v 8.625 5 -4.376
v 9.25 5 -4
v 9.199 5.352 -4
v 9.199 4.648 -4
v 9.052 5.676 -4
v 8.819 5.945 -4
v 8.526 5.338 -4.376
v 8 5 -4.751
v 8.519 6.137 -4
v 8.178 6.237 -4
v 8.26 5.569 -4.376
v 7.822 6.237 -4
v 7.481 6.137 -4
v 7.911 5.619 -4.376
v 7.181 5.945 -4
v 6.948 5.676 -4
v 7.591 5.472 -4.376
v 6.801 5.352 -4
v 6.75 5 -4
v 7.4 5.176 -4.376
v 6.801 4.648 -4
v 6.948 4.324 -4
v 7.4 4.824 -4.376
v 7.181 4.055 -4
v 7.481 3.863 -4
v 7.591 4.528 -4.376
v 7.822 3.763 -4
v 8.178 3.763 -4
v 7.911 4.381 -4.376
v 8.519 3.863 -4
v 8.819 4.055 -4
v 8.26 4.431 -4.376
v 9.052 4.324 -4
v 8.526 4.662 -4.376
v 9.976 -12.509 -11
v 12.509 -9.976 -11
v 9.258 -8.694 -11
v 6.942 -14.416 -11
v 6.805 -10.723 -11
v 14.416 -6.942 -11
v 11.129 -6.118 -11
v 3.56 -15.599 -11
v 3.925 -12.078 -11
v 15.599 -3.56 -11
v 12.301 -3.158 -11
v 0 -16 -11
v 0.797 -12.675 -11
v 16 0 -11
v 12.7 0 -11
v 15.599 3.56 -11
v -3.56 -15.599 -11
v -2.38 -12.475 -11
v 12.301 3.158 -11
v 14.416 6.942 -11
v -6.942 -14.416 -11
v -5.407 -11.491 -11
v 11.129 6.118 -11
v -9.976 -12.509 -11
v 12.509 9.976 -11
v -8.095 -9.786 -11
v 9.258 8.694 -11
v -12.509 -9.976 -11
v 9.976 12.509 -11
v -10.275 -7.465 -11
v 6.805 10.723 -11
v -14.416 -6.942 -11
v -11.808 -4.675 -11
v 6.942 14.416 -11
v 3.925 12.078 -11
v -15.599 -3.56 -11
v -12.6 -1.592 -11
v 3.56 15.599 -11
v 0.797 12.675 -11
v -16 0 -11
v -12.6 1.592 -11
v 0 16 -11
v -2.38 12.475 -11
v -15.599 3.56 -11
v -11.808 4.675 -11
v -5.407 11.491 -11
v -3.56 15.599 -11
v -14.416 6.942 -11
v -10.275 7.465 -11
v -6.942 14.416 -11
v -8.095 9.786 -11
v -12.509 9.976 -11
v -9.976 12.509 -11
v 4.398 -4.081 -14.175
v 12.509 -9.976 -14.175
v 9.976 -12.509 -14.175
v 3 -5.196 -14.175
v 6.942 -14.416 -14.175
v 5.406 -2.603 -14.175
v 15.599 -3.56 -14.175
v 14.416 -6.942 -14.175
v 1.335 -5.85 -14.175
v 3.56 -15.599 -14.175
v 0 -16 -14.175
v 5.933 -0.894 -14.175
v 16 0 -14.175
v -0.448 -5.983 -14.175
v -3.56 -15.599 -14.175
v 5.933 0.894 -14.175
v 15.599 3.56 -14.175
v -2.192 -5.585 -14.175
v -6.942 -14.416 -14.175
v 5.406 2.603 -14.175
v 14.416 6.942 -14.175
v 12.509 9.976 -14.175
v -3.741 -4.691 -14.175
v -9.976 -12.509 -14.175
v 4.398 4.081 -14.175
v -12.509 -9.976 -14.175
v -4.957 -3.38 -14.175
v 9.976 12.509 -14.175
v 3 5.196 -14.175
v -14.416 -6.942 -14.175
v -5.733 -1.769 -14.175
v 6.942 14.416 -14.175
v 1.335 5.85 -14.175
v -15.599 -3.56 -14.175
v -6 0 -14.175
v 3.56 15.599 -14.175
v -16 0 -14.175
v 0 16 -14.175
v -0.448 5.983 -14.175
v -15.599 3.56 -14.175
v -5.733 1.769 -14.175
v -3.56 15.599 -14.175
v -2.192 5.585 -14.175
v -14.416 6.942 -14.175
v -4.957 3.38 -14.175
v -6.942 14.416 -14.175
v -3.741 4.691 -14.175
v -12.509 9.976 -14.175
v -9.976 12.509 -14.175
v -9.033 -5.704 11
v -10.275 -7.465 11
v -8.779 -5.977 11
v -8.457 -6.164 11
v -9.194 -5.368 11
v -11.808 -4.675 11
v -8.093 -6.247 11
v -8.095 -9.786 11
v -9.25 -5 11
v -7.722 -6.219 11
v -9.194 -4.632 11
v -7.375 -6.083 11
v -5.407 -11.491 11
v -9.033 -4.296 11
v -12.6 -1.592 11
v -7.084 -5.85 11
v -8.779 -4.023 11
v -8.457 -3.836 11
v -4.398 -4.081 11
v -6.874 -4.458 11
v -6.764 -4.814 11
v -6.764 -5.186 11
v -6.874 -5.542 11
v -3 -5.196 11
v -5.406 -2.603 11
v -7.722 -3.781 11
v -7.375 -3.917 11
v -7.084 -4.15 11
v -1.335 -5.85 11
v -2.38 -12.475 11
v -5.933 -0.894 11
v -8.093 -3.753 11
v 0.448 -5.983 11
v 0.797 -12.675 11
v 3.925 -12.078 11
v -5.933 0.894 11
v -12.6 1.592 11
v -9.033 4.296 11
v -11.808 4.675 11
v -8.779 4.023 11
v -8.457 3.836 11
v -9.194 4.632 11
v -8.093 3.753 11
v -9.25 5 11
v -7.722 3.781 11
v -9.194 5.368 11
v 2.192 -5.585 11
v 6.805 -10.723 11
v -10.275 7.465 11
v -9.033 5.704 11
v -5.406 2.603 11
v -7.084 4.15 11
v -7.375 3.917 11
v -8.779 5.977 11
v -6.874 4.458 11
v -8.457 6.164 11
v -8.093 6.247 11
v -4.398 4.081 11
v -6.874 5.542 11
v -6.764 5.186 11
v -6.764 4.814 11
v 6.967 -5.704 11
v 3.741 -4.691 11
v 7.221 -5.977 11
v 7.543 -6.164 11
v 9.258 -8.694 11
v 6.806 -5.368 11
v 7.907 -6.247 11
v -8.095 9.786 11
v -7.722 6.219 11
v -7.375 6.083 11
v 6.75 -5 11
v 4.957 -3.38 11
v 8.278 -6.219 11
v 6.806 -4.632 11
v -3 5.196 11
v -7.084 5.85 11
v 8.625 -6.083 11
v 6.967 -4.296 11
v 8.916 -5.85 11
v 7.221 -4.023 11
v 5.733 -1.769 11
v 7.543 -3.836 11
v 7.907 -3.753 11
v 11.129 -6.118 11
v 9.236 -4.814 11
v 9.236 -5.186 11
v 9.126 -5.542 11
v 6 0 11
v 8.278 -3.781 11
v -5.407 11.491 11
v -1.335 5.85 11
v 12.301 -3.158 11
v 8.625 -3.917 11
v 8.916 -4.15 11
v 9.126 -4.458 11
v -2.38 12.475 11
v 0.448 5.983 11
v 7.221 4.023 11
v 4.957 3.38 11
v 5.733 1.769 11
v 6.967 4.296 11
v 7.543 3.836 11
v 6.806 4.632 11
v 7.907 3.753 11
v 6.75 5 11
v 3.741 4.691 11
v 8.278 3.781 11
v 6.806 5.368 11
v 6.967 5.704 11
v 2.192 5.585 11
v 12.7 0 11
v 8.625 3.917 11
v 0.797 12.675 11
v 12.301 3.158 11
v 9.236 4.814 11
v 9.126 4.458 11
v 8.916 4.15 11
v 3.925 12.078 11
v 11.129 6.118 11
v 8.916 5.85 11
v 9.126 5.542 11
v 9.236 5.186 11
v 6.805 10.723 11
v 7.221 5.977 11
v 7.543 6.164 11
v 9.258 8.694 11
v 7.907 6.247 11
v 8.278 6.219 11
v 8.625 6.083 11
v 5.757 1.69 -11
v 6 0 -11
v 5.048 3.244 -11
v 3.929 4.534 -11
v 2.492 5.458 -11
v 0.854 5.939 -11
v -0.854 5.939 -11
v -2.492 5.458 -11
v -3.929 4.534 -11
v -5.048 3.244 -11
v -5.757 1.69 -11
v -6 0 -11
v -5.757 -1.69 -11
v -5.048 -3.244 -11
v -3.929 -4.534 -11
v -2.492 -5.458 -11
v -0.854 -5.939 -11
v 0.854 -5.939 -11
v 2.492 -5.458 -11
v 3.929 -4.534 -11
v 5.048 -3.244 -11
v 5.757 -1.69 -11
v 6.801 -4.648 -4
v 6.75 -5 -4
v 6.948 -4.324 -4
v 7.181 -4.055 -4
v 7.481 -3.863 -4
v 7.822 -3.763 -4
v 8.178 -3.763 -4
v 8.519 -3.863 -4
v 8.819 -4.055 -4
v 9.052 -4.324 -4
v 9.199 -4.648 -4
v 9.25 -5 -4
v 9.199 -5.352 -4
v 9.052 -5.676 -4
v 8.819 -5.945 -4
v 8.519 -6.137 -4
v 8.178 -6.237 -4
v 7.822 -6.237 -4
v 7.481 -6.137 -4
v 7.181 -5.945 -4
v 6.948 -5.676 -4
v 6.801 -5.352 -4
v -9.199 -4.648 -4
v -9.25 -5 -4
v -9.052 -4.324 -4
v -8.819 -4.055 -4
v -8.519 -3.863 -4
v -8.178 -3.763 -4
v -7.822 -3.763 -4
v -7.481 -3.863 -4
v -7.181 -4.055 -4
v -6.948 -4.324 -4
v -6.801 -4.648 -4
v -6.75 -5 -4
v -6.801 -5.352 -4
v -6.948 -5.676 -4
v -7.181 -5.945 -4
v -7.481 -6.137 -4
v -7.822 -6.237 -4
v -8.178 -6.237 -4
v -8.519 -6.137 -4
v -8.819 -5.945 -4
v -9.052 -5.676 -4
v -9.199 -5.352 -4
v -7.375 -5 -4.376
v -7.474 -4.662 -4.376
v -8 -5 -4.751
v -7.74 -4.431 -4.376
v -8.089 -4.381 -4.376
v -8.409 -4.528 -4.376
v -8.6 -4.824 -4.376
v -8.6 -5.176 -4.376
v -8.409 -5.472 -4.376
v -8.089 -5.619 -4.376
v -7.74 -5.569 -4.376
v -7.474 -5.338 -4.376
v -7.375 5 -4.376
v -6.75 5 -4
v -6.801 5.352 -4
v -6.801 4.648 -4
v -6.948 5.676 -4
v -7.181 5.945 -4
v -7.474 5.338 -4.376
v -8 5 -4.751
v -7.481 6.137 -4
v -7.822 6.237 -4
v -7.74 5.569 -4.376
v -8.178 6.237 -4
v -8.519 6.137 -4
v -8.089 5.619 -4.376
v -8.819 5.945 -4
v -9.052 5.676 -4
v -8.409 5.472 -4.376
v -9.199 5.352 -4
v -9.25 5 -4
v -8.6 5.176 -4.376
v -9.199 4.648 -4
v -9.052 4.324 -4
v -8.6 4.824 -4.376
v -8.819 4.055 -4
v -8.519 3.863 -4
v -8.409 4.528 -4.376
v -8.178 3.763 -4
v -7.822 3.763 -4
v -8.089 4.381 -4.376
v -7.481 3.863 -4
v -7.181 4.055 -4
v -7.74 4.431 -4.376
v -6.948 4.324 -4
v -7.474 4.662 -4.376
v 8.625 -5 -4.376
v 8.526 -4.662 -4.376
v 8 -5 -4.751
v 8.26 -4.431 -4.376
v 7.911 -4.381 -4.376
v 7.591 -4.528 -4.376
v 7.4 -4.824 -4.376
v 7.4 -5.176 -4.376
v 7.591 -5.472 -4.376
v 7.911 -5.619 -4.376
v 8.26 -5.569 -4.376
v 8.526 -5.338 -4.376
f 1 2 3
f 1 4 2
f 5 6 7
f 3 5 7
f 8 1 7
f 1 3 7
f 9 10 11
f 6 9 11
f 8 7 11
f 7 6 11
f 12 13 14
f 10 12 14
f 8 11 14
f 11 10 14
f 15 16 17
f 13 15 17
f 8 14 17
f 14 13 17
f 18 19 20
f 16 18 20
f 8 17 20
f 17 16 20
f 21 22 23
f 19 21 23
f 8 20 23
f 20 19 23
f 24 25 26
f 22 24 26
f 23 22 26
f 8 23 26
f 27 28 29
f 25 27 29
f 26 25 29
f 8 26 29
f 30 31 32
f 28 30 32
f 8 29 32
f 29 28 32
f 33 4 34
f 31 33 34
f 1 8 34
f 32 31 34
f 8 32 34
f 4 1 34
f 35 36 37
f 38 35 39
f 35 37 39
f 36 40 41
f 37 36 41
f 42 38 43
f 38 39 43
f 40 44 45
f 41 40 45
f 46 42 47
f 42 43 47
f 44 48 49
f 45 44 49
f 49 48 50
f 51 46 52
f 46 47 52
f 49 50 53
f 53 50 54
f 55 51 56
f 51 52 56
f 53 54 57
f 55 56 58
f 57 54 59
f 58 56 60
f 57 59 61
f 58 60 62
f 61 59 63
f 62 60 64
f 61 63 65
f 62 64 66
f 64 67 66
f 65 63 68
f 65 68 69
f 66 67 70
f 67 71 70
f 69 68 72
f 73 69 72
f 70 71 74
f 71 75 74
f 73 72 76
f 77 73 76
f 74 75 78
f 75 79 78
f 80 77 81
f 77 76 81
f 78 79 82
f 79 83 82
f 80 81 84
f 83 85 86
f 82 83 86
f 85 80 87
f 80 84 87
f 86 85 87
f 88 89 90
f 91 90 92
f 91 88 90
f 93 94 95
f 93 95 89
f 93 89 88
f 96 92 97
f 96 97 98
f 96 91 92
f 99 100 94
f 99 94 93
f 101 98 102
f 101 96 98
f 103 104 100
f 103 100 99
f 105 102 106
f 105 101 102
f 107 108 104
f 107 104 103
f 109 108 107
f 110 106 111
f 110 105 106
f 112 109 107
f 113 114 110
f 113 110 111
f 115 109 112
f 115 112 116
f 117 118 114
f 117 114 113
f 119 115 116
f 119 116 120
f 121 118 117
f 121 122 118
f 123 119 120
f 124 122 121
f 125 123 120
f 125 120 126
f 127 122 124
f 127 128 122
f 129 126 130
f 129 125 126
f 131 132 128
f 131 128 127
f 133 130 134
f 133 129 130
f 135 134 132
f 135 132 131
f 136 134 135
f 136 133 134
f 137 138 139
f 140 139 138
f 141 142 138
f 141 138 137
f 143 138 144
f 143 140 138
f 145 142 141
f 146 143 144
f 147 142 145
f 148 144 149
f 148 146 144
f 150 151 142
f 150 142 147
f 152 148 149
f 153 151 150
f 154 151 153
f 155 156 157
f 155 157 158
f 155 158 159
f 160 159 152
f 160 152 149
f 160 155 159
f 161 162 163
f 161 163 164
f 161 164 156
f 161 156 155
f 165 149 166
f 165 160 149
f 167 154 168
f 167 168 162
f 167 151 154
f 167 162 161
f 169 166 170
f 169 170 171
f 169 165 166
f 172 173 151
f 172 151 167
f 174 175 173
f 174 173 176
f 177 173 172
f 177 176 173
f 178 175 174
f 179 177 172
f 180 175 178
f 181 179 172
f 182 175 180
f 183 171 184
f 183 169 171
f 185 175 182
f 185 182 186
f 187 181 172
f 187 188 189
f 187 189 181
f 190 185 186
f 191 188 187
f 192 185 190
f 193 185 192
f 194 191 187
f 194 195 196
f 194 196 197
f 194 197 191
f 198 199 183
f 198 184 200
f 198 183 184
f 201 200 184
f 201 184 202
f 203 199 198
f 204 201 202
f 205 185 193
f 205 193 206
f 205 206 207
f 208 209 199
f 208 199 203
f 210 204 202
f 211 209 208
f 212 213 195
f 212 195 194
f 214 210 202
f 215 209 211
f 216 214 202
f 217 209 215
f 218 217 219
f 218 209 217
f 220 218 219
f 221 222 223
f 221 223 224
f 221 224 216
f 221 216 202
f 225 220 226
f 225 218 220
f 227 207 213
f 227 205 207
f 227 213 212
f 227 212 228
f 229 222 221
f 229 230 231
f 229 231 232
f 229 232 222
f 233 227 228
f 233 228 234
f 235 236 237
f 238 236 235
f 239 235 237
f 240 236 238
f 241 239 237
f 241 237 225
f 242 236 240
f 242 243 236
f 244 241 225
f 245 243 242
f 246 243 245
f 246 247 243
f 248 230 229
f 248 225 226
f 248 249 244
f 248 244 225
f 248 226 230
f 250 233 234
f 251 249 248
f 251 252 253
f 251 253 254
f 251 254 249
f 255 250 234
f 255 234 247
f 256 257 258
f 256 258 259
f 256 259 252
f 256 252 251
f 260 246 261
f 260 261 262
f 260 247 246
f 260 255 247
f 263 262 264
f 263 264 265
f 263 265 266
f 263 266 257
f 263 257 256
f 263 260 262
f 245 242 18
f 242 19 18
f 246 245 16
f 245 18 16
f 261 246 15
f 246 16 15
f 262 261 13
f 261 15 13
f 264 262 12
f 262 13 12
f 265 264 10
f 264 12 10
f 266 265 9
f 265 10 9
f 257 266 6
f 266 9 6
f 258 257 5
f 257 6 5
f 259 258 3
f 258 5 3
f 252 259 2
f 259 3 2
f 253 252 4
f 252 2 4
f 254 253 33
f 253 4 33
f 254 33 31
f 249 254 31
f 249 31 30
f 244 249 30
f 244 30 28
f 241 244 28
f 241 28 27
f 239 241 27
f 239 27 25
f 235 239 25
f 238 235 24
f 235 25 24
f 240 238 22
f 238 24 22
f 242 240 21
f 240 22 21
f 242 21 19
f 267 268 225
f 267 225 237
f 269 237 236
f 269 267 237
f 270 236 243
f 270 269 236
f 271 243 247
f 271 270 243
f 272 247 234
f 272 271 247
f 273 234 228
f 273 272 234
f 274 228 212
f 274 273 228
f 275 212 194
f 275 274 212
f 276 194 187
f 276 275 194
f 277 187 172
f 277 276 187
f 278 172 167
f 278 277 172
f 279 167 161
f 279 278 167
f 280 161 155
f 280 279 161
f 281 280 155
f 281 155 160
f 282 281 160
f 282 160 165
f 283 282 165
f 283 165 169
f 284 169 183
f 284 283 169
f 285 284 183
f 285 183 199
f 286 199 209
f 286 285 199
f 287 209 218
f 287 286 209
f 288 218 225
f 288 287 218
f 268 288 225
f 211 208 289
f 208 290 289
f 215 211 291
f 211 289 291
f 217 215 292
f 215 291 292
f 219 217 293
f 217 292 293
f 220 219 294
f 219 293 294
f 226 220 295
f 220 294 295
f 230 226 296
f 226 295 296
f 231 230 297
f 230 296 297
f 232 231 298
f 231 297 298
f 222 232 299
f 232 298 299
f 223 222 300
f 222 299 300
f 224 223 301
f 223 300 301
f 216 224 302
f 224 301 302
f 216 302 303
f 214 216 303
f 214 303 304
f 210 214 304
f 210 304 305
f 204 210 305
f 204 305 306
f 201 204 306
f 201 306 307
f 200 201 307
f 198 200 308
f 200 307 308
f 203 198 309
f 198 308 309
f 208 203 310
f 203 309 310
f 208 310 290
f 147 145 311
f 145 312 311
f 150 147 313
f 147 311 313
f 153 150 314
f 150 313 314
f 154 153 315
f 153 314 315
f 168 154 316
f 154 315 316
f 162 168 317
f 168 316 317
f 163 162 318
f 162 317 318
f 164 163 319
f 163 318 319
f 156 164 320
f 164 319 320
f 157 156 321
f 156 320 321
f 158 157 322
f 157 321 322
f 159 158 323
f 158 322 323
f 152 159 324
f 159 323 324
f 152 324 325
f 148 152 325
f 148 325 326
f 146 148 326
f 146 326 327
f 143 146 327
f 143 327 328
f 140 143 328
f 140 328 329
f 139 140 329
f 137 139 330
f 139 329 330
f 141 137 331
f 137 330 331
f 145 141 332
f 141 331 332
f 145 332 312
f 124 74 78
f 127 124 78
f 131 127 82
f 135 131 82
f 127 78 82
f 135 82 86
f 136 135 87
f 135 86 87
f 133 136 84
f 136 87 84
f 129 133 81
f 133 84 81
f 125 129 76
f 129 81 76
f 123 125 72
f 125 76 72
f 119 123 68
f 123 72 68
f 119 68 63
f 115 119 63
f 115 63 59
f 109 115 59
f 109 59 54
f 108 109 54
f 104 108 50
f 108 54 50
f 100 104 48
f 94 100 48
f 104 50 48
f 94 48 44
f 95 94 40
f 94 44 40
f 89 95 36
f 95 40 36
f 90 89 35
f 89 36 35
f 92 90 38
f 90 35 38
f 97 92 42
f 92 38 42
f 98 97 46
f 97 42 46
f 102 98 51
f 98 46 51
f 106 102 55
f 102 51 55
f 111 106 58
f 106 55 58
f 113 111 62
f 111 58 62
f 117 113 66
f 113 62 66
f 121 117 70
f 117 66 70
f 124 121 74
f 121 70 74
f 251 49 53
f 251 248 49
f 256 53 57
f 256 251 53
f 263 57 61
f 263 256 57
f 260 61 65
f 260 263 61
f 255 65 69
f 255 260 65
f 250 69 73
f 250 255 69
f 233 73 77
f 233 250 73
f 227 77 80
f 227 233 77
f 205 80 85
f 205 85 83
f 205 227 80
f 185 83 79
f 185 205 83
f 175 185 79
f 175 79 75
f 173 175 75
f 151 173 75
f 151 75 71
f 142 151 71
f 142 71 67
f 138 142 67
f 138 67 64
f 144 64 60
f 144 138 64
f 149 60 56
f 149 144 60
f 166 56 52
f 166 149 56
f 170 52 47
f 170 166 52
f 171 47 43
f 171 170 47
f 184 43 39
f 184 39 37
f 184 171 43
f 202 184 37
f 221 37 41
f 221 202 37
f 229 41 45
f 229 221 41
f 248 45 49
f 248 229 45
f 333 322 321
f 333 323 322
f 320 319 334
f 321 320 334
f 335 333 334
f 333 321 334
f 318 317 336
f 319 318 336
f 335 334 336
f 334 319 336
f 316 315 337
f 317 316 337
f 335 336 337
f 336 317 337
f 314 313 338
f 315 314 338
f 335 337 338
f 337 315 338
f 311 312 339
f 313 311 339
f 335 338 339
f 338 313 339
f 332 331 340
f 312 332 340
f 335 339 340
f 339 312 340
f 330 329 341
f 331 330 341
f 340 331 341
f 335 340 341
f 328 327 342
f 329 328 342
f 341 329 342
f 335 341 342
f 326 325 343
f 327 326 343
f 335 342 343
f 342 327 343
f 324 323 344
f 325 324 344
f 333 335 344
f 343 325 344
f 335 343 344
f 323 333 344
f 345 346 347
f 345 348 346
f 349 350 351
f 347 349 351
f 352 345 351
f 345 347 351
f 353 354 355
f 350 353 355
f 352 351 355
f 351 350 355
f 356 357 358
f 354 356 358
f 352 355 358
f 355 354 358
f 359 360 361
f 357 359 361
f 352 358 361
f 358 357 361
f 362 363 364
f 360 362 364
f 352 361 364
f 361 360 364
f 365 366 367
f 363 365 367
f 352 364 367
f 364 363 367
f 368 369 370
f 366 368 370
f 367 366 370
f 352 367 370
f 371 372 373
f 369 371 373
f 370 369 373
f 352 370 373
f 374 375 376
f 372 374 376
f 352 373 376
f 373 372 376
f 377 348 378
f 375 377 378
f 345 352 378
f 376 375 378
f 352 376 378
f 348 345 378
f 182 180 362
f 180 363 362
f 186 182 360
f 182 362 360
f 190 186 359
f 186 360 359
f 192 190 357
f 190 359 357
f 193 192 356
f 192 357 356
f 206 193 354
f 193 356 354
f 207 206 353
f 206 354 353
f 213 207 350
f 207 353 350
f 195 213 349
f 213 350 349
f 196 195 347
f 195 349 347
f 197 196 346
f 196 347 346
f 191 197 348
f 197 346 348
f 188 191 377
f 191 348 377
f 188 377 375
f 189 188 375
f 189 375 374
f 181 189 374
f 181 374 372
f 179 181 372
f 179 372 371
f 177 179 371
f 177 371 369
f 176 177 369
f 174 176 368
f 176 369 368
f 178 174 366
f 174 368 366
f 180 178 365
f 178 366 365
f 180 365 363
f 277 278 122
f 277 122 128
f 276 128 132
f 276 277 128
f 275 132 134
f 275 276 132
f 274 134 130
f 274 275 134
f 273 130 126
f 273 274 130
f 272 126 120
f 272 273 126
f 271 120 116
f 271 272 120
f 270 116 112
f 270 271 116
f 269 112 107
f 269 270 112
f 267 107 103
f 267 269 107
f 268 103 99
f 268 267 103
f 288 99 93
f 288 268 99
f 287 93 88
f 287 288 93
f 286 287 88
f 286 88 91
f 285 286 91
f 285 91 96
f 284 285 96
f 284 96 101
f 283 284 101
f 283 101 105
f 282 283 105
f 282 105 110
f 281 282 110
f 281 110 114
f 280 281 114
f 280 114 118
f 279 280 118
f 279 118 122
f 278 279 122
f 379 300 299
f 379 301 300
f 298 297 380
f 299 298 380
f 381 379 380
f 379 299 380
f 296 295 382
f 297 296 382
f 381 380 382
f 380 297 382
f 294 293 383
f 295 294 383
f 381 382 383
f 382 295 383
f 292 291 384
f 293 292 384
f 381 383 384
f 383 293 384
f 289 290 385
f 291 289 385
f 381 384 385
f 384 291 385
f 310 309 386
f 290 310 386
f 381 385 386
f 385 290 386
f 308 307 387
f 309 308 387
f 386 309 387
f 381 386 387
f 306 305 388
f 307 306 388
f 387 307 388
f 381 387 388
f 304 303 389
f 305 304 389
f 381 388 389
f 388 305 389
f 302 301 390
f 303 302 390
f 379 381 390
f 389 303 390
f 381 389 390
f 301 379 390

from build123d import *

# Parameters (mm, degrees)
SKETCH2_R                 = 12.7
SKETCH2_R_2               = 6
BOSS_EXTRUDE1_DEPTH       = 11
SKETCH3_R                 = 16
SKETCH3_R_2               = 6
BOSS_EXTRUDE2_DEPTH       = 3.175
M3X0_5_TAPPED_HOLE1_D     = 2.5
M3X0_5_TAPPED_HOLE1_DEPTH = 15
M3X0_5_TAPPED_HOLE1_TIP   = 0.751075774


with BuildPart() as part:
    # Sketch2 → Boss-Extrude1 (new body, symmetric)
    with BuildSketch(Plane.XY):
        Circle(SKETCH2_R)
        Circle(SKETCH2_R_2, mode=Mode.SUBTRACT)
    extrude(amount=BOSS_EXTRUDE1_DEPTH, both=True)

    # Sketch3 → Boss-Extrude2 (add)
    with BuildSketch(Plane(origin=(0, 0, -11), x_dir=(-1, 0, 0), z_dir=(0, 0, -1))):
        Circle(SKETCH3_R)
        Circle(SKETCH3_R_2, mode=Mode.SUBTRACT)
    extrude(amount=BOSS_EXTRUDE2_DEPTH)

    # M3x0.5 Tapped Hole1
    with Locations(Plane.XY.offset(11)):
        with Locations((-8, 5), (-8, -5), (8, -5), (8, 5)):
            Hole(M3X0_5_TAPPED_HOLE1_D / 2, depth=M3X0_5_TAPPED_HOLE1_DEPTH)
            with Locations((0, 0, -(M3X0_5_TAPPED_HOLE1_DEPTH + M3X0_5_TAPPED_HOLE1_TIP / 2))):  # 118° drill point
                Cone(0, M3X0_5_TAPPED_HOLE1_D / 2, M3X0_5_TAPPED_HOLE1_TIP, mode=Mode.SUBTRACT)


solid = part.part
